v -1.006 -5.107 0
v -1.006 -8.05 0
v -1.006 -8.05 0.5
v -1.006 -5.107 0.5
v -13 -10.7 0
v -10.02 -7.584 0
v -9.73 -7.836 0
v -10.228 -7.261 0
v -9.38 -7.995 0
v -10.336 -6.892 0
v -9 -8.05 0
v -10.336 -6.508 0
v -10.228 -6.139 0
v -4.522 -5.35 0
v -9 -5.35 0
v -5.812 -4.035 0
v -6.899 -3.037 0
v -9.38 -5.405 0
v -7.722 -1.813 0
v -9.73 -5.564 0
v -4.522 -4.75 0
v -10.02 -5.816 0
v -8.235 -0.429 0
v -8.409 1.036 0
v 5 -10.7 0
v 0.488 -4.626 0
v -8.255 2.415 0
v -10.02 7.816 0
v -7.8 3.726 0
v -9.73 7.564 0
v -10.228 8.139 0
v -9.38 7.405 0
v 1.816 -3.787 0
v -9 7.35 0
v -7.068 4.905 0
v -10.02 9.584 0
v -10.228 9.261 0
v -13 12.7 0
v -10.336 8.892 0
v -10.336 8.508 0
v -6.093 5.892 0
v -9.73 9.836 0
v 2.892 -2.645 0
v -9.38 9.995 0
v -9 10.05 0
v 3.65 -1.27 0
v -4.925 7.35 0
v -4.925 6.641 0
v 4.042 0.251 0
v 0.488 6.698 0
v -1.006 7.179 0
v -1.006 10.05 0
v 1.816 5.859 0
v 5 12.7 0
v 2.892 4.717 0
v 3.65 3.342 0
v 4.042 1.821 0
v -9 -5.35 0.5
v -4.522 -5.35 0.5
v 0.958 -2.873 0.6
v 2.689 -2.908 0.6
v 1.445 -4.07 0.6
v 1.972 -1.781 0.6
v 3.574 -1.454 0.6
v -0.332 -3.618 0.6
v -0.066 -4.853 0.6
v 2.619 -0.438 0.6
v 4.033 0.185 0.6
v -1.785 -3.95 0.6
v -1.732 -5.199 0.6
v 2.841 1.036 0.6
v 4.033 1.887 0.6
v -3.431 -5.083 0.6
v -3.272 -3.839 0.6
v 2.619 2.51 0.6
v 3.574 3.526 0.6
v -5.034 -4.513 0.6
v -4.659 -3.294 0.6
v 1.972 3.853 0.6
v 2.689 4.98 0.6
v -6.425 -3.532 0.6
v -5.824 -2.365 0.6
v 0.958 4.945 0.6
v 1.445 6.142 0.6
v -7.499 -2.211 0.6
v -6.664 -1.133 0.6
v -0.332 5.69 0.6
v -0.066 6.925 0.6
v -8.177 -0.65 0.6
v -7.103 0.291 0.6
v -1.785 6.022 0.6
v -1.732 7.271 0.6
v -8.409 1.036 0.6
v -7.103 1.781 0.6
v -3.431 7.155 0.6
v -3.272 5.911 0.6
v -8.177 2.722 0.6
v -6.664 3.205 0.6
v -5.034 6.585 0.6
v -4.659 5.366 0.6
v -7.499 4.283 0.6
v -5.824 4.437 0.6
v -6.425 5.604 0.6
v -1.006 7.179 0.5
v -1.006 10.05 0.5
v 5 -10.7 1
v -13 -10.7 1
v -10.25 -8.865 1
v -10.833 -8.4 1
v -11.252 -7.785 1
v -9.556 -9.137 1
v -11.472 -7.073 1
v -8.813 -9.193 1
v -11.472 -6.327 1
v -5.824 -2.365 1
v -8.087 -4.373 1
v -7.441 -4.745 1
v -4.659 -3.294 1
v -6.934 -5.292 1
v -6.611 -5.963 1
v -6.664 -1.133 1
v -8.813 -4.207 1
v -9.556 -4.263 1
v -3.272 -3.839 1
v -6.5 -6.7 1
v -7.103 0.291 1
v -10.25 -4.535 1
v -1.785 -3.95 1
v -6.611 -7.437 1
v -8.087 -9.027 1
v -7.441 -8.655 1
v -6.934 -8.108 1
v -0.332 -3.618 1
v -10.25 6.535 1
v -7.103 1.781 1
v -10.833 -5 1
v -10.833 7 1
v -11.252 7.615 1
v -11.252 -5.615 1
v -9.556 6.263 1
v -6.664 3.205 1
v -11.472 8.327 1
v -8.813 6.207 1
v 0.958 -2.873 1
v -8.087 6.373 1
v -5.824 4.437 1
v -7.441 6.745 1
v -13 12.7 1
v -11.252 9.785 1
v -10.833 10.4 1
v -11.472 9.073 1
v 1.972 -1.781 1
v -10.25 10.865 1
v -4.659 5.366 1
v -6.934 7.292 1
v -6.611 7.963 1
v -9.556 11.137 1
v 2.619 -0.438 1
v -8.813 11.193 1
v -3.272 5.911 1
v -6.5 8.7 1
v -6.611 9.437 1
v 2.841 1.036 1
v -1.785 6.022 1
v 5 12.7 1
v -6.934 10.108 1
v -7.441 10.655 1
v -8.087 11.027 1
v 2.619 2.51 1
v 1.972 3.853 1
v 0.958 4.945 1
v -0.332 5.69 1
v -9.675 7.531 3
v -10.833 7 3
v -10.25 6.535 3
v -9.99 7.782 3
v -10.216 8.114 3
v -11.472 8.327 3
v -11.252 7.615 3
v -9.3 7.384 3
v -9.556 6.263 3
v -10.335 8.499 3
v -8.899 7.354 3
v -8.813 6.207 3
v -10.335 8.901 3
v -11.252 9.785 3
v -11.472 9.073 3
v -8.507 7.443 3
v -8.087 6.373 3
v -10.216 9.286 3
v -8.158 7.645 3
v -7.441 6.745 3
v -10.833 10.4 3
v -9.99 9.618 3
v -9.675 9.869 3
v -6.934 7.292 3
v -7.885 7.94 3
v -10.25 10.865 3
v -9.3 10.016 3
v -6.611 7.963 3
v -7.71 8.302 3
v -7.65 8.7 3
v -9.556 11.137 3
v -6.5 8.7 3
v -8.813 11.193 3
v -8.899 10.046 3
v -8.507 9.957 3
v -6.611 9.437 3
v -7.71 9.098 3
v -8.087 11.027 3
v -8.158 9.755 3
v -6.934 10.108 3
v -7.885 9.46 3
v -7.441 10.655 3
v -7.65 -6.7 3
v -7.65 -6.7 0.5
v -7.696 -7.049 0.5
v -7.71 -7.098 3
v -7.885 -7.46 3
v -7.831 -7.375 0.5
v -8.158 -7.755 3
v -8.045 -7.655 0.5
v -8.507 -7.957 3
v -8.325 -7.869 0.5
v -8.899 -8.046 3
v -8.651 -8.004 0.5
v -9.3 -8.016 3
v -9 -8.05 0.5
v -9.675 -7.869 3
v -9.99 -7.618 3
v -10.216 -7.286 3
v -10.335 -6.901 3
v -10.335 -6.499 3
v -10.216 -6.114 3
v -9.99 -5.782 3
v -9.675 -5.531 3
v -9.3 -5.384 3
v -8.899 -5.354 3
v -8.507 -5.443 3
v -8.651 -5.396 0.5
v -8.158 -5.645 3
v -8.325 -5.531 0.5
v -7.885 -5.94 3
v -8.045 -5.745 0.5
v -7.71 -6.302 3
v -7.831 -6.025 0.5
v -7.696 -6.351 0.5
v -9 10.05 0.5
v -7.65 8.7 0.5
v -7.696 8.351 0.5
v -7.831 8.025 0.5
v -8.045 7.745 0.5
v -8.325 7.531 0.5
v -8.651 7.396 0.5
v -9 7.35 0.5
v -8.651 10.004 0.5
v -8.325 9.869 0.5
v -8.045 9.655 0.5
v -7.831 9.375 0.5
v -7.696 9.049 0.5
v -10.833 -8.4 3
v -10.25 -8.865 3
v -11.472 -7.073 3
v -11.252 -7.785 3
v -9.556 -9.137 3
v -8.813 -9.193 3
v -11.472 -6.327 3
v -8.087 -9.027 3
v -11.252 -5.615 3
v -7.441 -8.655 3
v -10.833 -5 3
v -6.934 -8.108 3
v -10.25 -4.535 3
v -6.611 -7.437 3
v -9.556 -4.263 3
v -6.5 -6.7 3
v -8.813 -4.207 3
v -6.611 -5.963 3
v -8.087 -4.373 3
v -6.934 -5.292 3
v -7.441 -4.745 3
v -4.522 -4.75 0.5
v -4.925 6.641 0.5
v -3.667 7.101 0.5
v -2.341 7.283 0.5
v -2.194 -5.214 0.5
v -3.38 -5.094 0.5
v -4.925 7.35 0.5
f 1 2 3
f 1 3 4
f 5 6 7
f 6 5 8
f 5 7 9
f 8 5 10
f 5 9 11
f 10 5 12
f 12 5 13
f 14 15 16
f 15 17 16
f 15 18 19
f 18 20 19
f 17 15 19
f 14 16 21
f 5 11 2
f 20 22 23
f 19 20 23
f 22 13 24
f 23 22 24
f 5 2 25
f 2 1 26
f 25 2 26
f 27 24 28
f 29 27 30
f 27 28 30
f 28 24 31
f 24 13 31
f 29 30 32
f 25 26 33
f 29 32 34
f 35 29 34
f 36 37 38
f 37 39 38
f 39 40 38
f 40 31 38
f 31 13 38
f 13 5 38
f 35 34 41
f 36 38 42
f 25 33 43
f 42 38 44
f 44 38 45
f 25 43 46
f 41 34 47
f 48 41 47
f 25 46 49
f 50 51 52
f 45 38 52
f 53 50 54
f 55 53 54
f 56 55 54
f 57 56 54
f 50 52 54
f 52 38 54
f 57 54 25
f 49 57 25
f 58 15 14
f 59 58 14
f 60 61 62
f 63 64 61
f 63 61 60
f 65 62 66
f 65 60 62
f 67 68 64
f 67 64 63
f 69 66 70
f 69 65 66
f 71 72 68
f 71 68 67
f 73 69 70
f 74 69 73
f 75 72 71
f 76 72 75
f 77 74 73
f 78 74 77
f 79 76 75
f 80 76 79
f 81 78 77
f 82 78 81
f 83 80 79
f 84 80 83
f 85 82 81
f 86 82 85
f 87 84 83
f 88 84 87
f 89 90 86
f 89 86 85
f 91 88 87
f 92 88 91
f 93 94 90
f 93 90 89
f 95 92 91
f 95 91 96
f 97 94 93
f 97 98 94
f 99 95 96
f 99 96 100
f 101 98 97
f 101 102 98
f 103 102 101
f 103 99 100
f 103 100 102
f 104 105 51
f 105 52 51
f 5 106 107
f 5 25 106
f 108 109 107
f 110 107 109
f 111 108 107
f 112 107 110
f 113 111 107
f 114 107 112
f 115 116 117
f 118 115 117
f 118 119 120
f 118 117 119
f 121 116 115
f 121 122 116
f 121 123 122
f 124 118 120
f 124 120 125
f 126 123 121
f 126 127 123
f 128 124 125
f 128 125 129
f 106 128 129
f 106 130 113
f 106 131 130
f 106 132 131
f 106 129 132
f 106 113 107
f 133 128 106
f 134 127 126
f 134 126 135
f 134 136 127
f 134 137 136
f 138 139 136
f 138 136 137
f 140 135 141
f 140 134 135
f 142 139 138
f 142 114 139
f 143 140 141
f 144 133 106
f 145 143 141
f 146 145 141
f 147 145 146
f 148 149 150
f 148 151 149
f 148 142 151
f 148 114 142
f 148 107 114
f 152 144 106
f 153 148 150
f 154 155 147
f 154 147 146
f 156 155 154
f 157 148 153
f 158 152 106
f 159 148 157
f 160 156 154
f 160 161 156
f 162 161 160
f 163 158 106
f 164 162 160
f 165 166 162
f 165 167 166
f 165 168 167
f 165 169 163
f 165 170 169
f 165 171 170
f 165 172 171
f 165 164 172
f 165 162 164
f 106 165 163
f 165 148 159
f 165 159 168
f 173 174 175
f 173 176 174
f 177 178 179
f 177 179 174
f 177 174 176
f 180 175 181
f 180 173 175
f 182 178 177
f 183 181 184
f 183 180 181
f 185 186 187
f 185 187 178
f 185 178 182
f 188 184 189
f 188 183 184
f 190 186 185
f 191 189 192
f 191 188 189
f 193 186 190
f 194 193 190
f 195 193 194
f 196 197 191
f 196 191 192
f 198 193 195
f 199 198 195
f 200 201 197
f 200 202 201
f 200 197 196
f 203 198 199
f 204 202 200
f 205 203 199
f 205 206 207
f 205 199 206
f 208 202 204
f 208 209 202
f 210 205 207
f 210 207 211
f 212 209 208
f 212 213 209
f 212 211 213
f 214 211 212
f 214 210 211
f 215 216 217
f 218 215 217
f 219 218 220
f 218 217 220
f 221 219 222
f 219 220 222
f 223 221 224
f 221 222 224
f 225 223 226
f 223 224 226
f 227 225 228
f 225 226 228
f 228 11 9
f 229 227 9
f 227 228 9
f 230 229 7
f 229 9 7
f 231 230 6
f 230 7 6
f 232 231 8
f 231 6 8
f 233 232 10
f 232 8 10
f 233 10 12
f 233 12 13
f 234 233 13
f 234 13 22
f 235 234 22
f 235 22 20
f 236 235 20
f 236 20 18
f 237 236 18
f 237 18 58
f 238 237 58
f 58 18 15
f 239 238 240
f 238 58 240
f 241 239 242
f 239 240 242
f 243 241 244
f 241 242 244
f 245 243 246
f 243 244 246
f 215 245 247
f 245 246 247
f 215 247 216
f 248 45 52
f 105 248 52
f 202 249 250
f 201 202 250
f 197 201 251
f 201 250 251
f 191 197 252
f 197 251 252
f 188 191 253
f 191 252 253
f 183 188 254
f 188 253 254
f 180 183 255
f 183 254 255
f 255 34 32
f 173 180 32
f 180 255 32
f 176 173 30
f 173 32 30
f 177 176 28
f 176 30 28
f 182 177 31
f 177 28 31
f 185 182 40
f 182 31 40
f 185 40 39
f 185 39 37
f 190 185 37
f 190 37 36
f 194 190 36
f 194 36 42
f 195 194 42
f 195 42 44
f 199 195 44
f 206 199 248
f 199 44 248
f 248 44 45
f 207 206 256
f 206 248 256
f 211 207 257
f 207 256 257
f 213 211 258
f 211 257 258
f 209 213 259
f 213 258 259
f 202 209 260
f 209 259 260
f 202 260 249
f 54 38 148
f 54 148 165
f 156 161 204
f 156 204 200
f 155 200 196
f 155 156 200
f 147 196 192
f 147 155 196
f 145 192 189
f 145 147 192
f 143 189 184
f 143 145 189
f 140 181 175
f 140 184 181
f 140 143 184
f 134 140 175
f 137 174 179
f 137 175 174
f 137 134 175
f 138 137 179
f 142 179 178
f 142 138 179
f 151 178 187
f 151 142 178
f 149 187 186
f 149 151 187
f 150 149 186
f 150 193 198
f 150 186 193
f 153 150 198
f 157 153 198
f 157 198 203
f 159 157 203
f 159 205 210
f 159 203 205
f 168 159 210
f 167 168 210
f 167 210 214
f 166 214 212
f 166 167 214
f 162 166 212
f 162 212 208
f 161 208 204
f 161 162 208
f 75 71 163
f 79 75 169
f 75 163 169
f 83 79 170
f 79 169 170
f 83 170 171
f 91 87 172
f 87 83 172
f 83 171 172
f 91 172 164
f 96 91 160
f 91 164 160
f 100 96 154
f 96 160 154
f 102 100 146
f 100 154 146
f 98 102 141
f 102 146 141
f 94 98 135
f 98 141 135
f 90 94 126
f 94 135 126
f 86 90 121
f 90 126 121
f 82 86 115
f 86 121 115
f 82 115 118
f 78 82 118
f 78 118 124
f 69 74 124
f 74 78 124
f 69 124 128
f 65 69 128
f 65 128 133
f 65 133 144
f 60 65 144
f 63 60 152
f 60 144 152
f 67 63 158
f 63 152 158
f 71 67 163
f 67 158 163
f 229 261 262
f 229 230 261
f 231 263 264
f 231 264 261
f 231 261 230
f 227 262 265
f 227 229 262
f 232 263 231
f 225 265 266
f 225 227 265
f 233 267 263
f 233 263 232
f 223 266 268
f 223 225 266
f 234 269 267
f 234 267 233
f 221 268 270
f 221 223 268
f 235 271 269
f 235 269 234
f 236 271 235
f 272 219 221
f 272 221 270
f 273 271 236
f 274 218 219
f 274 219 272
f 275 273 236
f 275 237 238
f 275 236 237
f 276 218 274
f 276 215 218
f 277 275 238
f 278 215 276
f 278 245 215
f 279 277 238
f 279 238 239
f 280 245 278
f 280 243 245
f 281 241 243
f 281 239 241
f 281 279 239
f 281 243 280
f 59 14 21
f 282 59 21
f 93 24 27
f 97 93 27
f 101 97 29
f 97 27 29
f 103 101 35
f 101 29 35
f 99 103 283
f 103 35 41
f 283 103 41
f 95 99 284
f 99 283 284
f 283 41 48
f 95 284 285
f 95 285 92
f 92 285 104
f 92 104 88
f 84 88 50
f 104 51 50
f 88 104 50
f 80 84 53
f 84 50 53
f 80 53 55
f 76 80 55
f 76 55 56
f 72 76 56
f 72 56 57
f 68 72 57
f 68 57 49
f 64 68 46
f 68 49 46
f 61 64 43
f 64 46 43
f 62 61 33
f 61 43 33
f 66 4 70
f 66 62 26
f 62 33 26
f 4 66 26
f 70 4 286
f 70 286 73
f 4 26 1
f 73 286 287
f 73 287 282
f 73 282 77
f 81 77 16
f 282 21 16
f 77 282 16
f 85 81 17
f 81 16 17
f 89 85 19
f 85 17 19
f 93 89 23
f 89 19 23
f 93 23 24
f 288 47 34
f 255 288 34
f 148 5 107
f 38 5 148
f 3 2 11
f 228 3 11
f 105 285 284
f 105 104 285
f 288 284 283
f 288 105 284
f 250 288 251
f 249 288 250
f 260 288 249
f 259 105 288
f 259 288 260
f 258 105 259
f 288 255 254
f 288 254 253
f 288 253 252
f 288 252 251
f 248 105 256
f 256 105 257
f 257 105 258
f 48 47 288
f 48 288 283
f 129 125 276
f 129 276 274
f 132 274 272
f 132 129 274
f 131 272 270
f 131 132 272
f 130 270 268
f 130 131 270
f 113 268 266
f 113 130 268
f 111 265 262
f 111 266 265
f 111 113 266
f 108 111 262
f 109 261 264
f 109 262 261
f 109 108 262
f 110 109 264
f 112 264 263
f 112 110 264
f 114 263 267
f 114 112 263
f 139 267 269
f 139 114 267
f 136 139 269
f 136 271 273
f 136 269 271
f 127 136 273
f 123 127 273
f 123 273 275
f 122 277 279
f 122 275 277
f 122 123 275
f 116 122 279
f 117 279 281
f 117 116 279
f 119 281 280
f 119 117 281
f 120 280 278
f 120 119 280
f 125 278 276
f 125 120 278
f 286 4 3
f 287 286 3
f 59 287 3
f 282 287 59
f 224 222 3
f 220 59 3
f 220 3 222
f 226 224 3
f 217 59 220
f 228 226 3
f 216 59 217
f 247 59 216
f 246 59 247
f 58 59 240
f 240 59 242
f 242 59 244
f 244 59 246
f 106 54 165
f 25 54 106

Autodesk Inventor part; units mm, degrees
ref_plane "YZ Plane" through (0, 0, 0) normal (1, 0, 0) x (0, 1, 0)
ref_plane "XZ Plane" through (0, 0, 0) normal (0, 1, 0) x (-1, 0, 0)
ref_plane "Work Plane1" through (-1, 1, 0) normal (0, 0, 1) x (1, 0, 0)
sketch "Sketch1" plane through (-1, 1, 0) normal (0, 0, 1) x (1, 0, 0)
  circle A0 centre (-8, 7.7) radius 1.35 projected
  circle A1 centre (-8, -7.7) radius 1.35 projected
  circle A2 centre (-1.159, 0.036) radius 6 construction
  line L0 (-12, 11.7) -> (6, 11.7)
  line L1 (6, 11.7) -> (6, -11.7)
  line L2 (6, -11.7) -> (-12, -11.7)
  line L3 (-12, -11.7) -> (-12, 11.7)
  point P0 (1, -1)
  dimension "d0" = 18
  dimension "d2" = 4
  dimension "d3" = 4
  dimension "d12" = 4
extrude "Extrusion1" add sketch "Sketch1" along normal blind 1
sketch "Sketch2" plane through (-1, 1, 1) normal (0, 0, 1) x (1, 0, 0)
  circle A0 centre (-1.159, 0.036) radius 6 projected
  circle A1 centre (-1.159, 0.036) radius 5
  point P0 (1, -1)
  dimension "d6" = 10
extrude "Extrusion2" cut sketch "Sketch2" against normal through all contours A1
sketch "Sketch3" plane through (-1, 1, 0) normal (0, 0, -1) x (-1, 0, 0)
  circle A0 centre (1.159, 0.036) radius 5 projected
  circle A1 centre (1.159, 0.036) radius 6.25
  point P0 (-1, -1)
  dimension "d9" = 12.5
ref_plane "Work Plane2" through (-8.159, -4.964, 0.6) normal (0, 0, -1) x (0, 1, 0)
extrude "Extrusion3" cut sketch "Sketch3" against normal up to surface (0.6 mm away)
sketch "Sketch4" plane through (-1, 1, 0) normal (0, 0, -1) x (-1, 0, 0)
  circle A0 centre (8, 7.7) radius 1.35 projected
  circle A1 centre (8, -7.7) radius 1.35 projected
  circle A2 centre (1.159, 0.036) radius 6.25 projected
  line L0 (8, 9.05) -> (0.0063, 9.05)
  line L1 (0.0063, 9.05) -> (0.0063, 6.35)
  line L2 (0.0063, 6.35) -> (8, 6.35)
  line L3 (8, 6.35) -> (8, 9.05)
  line L4 (8, -6.35) -> (0.0063, -6.35)
  line L5 (0.0063, -6.35) -> (0.0063, -9.05)
  line L6 (0.0063, -9.05) -> (8, -9.05)
  line L7 (8, -9.05) -> (8, -6.35)
  line L8 (0.0063, -6.35) -> (0.0063, -6.1068)
  line L9 (3.5216, -6.35) -> (3.5216, -5.7502)
  circle A3 centre (1.159, 0.036) radius 6.25 projected
  line L10 (3.9246, 6.35) -> (3.9246, 5.6409)
  line L11 (0.0063, 6.35) -> (0.0063, 6.1788)
  point P0 (-1, -1)
extrude "Extrusion4" cut sketch "Sketch4" against normal blind 0.5 contours L3 A0 | A0 L2 L1 L0 | L10 A2 L11 L2 | A2 | A2 L9 L4 L8 | L4 A1 L6 L5 | L7 A1 picked at (7.3128, 7.4828) picked at (7.2624, -7.8211)
sketch "Sketch5" plane through (-1, 1, 1) normal (0, 0, 1) x (1, 0, 0)
  circle A0 centre (-8, 7.7) radius 0.5 projected
  circle A1 centre (-8, 7.7) radius 1.35 projected
  circle A2 centre (-8, -7.7) radius 0.5 projected
  circle A3 centre (-8, -7.7) radius 1.35 projected
  arc A4 (-8, 9.05) -> (-8, 6.35) centre (-8, 7.7) ccw projected
  circle A5 centre (-8, 7.7) radius 2.5
  circle A6 centre (-8, -7.7) radius 2.5
  point P0 (1, -1)
  dimension "d15" = 5
  dimension "d16" = 5
extrude "Extrusion5" add sketch "Sketch5" along normal blind 2 contours A5 | A6
properties part number "00_PDMS_chamber_fluidic_v0"
